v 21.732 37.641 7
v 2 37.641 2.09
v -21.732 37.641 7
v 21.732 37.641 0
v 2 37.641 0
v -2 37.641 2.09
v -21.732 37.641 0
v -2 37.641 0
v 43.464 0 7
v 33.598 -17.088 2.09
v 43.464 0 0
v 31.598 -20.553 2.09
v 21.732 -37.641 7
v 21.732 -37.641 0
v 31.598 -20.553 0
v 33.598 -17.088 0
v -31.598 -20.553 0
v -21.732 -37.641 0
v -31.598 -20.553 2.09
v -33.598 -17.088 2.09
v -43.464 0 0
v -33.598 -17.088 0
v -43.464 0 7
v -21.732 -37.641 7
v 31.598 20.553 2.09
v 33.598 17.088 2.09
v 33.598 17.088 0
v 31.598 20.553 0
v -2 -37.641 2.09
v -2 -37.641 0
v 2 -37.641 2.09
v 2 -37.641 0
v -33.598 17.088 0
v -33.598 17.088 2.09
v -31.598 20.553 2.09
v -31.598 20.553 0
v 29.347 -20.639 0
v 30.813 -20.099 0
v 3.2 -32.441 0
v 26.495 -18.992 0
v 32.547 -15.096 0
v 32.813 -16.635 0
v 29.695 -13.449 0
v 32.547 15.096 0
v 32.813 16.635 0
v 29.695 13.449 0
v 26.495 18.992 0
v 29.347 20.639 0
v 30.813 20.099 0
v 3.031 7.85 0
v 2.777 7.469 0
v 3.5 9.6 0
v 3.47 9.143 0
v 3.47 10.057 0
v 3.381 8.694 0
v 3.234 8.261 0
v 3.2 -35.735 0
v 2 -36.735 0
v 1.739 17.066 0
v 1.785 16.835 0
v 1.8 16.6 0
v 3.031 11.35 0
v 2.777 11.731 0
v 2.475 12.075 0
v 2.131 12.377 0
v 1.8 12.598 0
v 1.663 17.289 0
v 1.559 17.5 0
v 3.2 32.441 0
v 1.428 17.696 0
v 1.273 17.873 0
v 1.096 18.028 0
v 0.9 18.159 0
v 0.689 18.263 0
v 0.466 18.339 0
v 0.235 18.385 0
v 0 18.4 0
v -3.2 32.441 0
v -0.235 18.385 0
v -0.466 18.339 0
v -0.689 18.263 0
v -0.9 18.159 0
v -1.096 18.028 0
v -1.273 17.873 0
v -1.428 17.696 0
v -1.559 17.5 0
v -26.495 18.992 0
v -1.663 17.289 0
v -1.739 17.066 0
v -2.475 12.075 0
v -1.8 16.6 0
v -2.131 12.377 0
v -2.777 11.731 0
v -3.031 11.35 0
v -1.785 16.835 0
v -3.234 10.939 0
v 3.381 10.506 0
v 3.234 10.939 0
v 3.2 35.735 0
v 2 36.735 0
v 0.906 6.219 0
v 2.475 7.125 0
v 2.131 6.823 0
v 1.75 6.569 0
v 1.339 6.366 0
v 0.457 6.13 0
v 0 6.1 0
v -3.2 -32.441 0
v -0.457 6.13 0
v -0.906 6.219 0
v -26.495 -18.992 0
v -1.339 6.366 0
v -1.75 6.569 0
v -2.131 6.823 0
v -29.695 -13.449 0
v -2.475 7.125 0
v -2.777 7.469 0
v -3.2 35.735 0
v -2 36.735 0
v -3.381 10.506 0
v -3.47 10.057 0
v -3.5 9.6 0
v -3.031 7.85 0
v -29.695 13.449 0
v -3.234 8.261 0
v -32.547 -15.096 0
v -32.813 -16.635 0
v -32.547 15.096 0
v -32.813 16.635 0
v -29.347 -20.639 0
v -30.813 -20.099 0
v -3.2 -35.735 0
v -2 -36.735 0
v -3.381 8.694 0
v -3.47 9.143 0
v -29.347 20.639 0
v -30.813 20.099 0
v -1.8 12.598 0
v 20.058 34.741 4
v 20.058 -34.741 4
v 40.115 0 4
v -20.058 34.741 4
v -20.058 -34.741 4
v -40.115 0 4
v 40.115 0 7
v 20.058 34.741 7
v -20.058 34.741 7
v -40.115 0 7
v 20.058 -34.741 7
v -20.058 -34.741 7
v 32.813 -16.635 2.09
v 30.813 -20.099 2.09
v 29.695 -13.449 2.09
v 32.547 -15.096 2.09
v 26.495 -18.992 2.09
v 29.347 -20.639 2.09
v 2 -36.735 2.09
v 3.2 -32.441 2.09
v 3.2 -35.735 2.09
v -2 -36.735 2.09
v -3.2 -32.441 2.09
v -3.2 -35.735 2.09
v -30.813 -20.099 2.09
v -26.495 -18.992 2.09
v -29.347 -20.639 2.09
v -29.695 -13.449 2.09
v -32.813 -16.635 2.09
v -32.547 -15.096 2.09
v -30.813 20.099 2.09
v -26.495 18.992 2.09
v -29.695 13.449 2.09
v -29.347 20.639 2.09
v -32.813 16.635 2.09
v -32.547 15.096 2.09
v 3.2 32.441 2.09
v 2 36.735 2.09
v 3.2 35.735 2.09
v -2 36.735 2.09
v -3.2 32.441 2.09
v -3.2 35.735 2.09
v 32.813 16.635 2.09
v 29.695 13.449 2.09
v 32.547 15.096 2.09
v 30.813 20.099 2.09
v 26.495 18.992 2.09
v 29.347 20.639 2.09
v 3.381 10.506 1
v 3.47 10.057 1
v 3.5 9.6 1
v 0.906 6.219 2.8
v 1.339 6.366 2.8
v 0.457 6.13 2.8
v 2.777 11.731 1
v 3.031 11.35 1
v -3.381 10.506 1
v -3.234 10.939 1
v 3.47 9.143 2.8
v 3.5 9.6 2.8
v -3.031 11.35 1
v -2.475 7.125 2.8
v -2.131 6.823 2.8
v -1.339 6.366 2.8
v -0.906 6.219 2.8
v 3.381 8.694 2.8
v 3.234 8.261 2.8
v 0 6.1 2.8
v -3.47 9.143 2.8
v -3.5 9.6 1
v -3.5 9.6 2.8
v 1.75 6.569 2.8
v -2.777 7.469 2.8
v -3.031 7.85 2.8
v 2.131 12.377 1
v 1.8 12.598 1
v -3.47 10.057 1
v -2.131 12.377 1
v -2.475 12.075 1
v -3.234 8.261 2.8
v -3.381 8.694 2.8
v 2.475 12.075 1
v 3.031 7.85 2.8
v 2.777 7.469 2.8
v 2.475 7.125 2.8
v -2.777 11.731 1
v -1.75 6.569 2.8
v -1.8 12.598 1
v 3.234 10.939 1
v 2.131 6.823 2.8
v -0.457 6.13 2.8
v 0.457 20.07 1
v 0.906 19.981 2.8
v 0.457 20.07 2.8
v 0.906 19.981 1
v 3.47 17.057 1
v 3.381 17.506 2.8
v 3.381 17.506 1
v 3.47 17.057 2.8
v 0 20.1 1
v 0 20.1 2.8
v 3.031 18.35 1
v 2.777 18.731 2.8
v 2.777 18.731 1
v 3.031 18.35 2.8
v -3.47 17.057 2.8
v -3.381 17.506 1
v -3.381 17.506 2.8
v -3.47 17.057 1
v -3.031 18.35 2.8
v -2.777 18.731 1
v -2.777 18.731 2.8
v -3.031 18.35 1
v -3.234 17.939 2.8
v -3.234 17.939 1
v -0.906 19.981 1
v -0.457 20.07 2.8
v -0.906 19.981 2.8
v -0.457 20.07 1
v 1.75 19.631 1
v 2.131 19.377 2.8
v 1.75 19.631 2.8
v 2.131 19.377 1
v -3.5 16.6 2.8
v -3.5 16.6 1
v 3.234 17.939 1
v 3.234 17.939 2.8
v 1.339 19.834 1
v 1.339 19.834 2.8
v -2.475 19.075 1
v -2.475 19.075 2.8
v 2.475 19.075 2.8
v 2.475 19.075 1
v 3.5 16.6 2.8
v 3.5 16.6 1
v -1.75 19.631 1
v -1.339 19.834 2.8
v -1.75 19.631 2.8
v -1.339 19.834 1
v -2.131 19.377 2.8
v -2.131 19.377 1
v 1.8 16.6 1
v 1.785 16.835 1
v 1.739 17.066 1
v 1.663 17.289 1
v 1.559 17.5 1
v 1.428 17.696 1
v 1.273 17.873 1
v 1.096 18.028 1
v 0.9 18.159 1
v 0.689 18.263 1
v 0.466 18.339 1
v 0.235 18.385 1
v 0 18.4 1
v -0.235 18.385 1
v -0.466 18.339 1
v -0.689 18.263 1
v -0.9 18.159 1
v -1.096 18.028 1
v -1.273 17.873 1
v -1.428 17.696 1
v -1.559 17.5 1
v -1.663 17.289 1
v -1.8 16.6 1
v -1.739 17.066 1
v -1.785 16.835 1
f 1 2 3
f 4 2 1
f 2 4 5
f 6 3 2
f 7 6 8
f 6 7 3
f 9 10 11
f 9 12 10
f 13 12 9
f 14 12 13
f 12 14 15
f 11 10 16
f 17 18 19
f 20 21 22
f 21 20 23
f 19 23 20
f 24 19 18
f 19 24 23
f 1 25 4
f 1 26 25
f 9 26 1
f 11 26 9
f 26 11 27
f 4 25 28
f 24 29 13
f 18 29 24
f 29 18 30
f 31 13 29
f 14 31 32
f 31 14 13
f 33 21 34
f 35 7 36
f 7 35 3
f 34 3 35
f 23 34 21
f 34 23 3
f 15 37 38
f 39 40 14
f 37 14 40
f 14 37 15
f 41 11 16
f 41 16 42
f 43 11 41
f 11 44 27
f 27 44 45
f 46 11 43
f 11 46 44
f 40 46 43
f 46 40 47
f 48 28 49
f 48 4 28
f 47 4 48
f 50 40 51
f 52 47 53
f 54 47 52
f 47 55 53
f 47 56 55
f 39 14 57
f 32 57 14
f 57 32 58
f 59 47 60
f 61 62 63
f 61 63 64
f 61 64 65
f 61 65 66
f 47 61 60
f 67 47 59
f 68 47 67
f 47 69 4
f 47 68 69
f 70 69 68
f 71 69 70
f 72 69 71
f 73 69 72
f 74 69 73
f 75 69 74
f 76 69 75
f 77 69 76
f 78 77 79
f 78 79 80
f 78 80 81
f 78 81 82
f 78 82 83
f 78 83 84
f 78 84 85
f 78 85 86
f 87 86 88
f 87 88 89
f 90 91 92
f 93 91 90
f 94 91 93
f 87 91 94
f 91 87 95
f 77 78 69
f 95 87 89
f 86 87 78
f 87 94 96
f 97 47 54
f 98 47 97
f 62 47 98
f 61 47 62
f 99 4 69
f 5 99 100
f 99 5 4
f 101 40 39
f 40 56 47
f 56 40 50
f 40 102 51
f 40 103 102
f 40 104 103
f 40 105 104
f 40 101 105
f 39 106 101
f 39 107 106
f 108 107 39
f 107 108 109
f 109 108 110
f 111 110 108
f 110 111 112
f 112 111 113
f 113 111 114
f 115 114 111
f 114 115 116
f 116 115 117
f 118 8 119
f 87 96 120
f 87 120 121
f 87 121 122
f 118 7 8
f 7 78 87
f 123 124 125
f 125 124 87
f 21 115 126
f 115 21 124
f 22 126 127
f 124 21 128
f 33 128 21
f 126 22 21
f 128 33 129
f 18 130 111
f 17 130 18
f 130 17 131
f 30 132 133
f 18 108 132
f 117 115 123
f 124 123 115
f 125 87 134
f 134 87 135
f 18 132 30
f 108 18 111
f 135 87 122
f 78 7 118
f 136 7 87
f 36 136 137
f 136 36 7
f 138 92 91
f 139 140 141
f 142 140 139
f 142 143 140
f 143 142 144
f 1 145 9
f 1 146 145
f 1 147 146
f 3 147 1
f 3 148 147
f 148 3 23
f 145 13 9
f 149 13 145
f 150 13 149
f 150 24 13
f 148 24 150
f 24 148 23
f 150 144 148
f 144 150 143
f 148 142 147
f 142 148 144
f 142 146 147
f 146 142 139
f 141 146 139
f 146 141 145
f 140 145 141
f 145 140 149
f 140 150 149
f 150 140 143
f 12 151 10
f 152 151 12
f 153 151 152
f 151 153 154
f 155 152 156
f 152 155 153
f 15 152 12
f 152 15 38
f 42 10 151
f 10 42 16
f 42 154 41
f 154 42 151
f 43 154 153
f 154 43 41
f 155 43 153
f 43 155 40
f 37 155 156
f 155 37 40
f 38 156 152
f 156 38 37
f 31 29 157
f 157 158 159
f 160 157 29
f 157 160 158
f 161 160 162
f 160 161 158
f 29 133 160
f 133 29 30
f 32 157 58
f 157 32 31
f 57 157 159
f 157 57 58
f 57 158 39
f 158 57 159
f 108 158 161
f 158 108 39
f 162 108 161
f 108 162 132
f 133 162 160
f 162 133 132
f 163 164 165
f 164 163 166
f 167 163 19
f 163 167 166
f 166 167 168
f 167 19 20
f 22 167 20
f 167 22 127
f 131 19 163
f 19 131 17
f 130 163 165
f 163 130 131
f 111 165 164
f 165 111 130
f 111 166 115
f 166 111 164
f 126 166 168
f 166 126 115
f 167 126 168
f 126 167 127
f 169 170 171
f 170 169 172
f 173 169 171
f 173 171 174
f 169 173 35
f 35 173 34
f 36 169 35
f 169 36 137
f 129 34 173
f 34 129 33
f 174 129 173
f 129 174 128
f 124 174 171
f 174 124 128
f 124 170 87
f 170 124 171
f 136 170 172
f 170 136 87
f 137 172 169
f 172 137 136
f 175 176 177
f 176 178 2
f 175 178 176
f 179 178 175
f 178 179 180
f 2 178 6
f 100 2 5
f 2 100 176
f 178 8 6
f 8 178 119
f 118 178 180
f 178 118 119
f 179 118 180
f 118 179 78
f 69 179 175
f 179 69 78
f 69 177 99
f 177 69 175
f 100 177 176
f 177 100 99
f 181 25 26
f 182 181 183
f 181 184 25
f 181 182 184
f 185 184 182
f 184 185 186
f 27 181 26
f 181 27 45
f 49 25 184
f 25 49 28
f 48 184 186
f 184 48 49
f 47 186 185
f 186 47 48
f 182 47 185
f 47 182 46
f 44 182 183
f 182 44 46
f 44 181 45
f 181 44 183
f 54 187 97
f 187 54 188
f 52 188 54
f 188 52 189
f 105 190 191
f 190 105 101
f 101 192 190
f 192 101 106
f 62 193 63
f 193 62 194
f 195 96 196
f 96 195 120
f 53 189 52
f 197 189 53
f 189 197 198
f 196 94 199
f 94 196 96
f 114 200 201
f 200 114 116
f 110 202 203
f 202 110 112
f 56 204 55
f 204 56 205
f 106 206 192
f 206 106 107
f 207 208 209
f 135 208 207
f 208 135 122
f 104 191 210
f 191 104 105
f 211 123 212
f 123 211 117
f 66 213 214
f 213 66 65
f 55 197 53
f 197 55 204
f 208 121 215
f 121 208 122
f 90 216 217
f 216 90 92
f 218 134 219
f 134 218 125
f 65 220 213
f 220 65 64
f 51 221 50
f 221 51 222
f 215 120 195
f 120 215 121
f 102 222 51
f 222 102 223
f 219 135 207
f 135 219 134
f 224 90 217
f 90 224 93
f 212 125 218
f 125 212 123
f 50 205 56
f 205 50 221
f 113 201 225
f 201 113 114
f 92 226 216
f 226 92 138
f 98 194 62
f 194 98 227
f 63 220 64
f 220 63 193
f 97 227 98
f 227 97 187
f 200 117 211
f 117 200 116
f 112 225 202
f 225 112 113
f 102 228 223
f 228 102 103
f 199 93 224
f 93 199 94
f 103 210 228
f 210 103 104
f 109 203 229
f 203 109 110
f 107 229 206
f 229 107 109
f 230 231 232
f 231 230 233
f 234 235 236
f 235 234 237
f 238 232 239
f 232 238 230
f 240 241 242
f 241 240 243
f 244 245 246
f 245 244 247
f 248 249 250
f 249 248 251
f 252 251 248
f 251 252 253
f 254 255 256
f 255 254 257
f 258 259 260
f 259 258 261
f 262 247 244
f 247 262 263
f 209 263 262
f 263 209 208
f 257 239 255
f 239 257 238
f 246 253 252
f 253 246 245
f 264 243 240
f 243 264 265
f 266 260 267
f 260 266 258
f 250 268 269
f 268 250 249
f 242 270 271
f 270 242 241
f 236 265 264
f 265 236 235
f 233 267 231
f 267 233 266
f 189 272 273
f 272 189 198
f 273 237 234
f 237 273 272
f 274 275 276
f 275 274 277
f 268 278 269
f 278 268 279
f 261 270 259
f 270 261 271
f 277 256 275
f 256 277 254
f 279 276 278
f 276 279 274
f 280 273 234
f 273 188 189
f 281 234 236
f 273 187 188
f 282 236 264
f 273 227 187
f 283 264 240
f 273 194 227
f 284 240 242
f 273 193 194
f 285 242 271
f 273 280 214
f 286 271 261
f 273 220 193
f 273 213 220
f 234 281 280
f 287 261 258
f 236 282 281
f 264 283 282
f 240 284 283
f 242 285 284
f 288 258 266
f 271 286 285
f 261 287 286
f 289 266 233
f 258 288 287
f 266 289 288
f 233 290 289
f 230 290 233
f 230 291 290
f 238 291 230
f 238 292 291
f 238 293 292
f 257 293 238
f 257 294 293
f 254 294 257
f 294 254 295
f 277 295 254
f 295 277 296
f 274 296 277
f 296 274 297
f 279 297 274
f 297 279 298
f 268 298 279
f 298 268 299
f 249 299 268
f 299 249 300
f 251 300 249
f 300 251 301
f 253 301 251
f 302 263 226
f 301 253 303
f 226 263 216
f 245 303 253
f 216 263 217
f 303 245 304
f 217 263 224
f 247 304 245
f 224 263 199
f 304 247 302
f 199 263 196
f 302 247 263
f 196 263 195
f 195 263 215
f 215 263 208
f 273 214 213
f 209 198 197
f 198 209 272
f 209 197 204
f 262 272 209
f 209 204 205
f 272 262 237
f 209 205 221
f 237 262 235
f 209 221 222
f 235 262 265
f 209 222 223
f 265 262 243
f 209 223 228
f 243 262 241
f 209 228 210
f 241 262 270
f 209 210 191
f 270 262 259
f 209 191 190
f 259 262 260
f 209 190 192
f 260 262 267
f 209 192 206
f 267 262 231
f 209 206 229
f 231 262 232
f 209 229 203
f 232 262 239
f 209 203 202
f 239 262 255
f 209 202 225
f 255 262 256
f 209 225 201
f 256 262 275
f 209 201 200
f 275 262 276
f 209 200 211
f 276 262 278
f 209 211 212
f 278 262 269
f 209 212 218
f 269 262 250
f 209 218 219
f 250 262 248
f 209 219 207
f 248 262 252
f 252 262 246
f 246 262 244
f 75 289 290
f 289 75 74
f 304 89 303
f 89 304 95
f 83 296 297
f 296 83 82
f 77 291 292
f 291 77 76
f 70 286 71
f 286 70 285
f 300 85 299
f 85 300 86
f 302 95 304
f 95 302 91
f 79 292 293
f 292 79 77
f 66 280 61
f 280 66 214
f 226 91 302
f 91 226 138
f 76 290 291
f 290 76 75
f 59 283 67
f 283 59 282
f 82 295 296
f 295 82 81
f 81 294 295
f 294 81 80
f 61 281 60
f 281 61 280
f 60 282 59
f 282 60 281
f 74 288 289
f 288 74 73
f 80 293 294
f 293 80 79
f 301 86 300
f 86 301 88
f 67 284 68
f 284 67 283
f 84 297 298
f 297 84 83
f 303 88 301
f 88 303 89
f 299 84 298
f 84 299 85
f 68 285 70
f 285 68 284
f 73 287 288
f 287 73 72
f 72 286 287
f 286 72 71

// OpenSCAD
// Contour Studio hex holder. mm. Same sockets and keyhole as modular map holders.
$fn=48; tile=80; gap=6; tolerance=.2; seat=4; rim=3;
module tile_shape(){polygon([[40.0, 7.105427357601002e-15], [20.0, 34.64101615137755], [-19.999999999999993, 34.64101615137755], [-40.0, 1.4210854715202004e-14], [-20.000000000000018, -34.64101615137753], [20.0, -34.641016151377535]]);}
module key_shape(){polygon([[-5,-3],[-2,-3],[-1,-1.8],[1,-1.8],[2,-3],[5,-3],[5,3],[2,3],[1,1.8],[-1,1.8],[-2,3],[-5,3]]);}
difference(){
 union(){linear_extrude(seat) offset(delta=gap/2) tile_shape();translate([0,0,seat]) linear_extrude(rim) difference(){offset(delta=gap/2) tile_shape();offset(delta=tolerance/2) tile_shape();}}
translate([32.598076211353316,-18.820508075688764,-.01]) rotate([0,0,-29.999999999999993]) linear_extrude(2.1) offset(delta=tolerance) key_shape();
translate([-7.105427357601002e-15,-37.64101615137753,-.01]) rotate([0,0,-90.00000000000001]) linear_extrude(2.1) offset(delta=tolerance) key_shape();
translate([-32.59807621135333,-18.820508075688757,-.01]) rotate([0,0,-150.00000000000003]) linear_extrude(2.1) offset(delta=tolerance) key_shape();
translate([-32.598076211353316,18.82050807568878,-.01]) rotate([0,0,149.99999999999997]) linear_extrude(2.1) offset(delta=tolerance) key_shape();
translate([5.329070518200751e-15,37.64101615137755,-.01]) rotate([0,0,90.0]) linear_extrude(2.1) offset(delta=tolerance) key_shape();
translate([32.598076211353316,18.820508075688778,-.01]) rotate([0,0,30.00000000000001]) linear_extrude(2.1) offset(delta=tolerance) key_shape();
translate([0,9.6,-.01]) cylinder(h=2.8,r=3.5);
translate([0,9.6,1]) linear_extrude(1.8) hull(){circle(r=3.5);translate([0,7]) circle(r=3.5);}
translate([0,9.6,-.01]) linear_extrude(1.1) hull(){circle(r=1.8);translate([0,7]) circle(r=1.8);}
}
